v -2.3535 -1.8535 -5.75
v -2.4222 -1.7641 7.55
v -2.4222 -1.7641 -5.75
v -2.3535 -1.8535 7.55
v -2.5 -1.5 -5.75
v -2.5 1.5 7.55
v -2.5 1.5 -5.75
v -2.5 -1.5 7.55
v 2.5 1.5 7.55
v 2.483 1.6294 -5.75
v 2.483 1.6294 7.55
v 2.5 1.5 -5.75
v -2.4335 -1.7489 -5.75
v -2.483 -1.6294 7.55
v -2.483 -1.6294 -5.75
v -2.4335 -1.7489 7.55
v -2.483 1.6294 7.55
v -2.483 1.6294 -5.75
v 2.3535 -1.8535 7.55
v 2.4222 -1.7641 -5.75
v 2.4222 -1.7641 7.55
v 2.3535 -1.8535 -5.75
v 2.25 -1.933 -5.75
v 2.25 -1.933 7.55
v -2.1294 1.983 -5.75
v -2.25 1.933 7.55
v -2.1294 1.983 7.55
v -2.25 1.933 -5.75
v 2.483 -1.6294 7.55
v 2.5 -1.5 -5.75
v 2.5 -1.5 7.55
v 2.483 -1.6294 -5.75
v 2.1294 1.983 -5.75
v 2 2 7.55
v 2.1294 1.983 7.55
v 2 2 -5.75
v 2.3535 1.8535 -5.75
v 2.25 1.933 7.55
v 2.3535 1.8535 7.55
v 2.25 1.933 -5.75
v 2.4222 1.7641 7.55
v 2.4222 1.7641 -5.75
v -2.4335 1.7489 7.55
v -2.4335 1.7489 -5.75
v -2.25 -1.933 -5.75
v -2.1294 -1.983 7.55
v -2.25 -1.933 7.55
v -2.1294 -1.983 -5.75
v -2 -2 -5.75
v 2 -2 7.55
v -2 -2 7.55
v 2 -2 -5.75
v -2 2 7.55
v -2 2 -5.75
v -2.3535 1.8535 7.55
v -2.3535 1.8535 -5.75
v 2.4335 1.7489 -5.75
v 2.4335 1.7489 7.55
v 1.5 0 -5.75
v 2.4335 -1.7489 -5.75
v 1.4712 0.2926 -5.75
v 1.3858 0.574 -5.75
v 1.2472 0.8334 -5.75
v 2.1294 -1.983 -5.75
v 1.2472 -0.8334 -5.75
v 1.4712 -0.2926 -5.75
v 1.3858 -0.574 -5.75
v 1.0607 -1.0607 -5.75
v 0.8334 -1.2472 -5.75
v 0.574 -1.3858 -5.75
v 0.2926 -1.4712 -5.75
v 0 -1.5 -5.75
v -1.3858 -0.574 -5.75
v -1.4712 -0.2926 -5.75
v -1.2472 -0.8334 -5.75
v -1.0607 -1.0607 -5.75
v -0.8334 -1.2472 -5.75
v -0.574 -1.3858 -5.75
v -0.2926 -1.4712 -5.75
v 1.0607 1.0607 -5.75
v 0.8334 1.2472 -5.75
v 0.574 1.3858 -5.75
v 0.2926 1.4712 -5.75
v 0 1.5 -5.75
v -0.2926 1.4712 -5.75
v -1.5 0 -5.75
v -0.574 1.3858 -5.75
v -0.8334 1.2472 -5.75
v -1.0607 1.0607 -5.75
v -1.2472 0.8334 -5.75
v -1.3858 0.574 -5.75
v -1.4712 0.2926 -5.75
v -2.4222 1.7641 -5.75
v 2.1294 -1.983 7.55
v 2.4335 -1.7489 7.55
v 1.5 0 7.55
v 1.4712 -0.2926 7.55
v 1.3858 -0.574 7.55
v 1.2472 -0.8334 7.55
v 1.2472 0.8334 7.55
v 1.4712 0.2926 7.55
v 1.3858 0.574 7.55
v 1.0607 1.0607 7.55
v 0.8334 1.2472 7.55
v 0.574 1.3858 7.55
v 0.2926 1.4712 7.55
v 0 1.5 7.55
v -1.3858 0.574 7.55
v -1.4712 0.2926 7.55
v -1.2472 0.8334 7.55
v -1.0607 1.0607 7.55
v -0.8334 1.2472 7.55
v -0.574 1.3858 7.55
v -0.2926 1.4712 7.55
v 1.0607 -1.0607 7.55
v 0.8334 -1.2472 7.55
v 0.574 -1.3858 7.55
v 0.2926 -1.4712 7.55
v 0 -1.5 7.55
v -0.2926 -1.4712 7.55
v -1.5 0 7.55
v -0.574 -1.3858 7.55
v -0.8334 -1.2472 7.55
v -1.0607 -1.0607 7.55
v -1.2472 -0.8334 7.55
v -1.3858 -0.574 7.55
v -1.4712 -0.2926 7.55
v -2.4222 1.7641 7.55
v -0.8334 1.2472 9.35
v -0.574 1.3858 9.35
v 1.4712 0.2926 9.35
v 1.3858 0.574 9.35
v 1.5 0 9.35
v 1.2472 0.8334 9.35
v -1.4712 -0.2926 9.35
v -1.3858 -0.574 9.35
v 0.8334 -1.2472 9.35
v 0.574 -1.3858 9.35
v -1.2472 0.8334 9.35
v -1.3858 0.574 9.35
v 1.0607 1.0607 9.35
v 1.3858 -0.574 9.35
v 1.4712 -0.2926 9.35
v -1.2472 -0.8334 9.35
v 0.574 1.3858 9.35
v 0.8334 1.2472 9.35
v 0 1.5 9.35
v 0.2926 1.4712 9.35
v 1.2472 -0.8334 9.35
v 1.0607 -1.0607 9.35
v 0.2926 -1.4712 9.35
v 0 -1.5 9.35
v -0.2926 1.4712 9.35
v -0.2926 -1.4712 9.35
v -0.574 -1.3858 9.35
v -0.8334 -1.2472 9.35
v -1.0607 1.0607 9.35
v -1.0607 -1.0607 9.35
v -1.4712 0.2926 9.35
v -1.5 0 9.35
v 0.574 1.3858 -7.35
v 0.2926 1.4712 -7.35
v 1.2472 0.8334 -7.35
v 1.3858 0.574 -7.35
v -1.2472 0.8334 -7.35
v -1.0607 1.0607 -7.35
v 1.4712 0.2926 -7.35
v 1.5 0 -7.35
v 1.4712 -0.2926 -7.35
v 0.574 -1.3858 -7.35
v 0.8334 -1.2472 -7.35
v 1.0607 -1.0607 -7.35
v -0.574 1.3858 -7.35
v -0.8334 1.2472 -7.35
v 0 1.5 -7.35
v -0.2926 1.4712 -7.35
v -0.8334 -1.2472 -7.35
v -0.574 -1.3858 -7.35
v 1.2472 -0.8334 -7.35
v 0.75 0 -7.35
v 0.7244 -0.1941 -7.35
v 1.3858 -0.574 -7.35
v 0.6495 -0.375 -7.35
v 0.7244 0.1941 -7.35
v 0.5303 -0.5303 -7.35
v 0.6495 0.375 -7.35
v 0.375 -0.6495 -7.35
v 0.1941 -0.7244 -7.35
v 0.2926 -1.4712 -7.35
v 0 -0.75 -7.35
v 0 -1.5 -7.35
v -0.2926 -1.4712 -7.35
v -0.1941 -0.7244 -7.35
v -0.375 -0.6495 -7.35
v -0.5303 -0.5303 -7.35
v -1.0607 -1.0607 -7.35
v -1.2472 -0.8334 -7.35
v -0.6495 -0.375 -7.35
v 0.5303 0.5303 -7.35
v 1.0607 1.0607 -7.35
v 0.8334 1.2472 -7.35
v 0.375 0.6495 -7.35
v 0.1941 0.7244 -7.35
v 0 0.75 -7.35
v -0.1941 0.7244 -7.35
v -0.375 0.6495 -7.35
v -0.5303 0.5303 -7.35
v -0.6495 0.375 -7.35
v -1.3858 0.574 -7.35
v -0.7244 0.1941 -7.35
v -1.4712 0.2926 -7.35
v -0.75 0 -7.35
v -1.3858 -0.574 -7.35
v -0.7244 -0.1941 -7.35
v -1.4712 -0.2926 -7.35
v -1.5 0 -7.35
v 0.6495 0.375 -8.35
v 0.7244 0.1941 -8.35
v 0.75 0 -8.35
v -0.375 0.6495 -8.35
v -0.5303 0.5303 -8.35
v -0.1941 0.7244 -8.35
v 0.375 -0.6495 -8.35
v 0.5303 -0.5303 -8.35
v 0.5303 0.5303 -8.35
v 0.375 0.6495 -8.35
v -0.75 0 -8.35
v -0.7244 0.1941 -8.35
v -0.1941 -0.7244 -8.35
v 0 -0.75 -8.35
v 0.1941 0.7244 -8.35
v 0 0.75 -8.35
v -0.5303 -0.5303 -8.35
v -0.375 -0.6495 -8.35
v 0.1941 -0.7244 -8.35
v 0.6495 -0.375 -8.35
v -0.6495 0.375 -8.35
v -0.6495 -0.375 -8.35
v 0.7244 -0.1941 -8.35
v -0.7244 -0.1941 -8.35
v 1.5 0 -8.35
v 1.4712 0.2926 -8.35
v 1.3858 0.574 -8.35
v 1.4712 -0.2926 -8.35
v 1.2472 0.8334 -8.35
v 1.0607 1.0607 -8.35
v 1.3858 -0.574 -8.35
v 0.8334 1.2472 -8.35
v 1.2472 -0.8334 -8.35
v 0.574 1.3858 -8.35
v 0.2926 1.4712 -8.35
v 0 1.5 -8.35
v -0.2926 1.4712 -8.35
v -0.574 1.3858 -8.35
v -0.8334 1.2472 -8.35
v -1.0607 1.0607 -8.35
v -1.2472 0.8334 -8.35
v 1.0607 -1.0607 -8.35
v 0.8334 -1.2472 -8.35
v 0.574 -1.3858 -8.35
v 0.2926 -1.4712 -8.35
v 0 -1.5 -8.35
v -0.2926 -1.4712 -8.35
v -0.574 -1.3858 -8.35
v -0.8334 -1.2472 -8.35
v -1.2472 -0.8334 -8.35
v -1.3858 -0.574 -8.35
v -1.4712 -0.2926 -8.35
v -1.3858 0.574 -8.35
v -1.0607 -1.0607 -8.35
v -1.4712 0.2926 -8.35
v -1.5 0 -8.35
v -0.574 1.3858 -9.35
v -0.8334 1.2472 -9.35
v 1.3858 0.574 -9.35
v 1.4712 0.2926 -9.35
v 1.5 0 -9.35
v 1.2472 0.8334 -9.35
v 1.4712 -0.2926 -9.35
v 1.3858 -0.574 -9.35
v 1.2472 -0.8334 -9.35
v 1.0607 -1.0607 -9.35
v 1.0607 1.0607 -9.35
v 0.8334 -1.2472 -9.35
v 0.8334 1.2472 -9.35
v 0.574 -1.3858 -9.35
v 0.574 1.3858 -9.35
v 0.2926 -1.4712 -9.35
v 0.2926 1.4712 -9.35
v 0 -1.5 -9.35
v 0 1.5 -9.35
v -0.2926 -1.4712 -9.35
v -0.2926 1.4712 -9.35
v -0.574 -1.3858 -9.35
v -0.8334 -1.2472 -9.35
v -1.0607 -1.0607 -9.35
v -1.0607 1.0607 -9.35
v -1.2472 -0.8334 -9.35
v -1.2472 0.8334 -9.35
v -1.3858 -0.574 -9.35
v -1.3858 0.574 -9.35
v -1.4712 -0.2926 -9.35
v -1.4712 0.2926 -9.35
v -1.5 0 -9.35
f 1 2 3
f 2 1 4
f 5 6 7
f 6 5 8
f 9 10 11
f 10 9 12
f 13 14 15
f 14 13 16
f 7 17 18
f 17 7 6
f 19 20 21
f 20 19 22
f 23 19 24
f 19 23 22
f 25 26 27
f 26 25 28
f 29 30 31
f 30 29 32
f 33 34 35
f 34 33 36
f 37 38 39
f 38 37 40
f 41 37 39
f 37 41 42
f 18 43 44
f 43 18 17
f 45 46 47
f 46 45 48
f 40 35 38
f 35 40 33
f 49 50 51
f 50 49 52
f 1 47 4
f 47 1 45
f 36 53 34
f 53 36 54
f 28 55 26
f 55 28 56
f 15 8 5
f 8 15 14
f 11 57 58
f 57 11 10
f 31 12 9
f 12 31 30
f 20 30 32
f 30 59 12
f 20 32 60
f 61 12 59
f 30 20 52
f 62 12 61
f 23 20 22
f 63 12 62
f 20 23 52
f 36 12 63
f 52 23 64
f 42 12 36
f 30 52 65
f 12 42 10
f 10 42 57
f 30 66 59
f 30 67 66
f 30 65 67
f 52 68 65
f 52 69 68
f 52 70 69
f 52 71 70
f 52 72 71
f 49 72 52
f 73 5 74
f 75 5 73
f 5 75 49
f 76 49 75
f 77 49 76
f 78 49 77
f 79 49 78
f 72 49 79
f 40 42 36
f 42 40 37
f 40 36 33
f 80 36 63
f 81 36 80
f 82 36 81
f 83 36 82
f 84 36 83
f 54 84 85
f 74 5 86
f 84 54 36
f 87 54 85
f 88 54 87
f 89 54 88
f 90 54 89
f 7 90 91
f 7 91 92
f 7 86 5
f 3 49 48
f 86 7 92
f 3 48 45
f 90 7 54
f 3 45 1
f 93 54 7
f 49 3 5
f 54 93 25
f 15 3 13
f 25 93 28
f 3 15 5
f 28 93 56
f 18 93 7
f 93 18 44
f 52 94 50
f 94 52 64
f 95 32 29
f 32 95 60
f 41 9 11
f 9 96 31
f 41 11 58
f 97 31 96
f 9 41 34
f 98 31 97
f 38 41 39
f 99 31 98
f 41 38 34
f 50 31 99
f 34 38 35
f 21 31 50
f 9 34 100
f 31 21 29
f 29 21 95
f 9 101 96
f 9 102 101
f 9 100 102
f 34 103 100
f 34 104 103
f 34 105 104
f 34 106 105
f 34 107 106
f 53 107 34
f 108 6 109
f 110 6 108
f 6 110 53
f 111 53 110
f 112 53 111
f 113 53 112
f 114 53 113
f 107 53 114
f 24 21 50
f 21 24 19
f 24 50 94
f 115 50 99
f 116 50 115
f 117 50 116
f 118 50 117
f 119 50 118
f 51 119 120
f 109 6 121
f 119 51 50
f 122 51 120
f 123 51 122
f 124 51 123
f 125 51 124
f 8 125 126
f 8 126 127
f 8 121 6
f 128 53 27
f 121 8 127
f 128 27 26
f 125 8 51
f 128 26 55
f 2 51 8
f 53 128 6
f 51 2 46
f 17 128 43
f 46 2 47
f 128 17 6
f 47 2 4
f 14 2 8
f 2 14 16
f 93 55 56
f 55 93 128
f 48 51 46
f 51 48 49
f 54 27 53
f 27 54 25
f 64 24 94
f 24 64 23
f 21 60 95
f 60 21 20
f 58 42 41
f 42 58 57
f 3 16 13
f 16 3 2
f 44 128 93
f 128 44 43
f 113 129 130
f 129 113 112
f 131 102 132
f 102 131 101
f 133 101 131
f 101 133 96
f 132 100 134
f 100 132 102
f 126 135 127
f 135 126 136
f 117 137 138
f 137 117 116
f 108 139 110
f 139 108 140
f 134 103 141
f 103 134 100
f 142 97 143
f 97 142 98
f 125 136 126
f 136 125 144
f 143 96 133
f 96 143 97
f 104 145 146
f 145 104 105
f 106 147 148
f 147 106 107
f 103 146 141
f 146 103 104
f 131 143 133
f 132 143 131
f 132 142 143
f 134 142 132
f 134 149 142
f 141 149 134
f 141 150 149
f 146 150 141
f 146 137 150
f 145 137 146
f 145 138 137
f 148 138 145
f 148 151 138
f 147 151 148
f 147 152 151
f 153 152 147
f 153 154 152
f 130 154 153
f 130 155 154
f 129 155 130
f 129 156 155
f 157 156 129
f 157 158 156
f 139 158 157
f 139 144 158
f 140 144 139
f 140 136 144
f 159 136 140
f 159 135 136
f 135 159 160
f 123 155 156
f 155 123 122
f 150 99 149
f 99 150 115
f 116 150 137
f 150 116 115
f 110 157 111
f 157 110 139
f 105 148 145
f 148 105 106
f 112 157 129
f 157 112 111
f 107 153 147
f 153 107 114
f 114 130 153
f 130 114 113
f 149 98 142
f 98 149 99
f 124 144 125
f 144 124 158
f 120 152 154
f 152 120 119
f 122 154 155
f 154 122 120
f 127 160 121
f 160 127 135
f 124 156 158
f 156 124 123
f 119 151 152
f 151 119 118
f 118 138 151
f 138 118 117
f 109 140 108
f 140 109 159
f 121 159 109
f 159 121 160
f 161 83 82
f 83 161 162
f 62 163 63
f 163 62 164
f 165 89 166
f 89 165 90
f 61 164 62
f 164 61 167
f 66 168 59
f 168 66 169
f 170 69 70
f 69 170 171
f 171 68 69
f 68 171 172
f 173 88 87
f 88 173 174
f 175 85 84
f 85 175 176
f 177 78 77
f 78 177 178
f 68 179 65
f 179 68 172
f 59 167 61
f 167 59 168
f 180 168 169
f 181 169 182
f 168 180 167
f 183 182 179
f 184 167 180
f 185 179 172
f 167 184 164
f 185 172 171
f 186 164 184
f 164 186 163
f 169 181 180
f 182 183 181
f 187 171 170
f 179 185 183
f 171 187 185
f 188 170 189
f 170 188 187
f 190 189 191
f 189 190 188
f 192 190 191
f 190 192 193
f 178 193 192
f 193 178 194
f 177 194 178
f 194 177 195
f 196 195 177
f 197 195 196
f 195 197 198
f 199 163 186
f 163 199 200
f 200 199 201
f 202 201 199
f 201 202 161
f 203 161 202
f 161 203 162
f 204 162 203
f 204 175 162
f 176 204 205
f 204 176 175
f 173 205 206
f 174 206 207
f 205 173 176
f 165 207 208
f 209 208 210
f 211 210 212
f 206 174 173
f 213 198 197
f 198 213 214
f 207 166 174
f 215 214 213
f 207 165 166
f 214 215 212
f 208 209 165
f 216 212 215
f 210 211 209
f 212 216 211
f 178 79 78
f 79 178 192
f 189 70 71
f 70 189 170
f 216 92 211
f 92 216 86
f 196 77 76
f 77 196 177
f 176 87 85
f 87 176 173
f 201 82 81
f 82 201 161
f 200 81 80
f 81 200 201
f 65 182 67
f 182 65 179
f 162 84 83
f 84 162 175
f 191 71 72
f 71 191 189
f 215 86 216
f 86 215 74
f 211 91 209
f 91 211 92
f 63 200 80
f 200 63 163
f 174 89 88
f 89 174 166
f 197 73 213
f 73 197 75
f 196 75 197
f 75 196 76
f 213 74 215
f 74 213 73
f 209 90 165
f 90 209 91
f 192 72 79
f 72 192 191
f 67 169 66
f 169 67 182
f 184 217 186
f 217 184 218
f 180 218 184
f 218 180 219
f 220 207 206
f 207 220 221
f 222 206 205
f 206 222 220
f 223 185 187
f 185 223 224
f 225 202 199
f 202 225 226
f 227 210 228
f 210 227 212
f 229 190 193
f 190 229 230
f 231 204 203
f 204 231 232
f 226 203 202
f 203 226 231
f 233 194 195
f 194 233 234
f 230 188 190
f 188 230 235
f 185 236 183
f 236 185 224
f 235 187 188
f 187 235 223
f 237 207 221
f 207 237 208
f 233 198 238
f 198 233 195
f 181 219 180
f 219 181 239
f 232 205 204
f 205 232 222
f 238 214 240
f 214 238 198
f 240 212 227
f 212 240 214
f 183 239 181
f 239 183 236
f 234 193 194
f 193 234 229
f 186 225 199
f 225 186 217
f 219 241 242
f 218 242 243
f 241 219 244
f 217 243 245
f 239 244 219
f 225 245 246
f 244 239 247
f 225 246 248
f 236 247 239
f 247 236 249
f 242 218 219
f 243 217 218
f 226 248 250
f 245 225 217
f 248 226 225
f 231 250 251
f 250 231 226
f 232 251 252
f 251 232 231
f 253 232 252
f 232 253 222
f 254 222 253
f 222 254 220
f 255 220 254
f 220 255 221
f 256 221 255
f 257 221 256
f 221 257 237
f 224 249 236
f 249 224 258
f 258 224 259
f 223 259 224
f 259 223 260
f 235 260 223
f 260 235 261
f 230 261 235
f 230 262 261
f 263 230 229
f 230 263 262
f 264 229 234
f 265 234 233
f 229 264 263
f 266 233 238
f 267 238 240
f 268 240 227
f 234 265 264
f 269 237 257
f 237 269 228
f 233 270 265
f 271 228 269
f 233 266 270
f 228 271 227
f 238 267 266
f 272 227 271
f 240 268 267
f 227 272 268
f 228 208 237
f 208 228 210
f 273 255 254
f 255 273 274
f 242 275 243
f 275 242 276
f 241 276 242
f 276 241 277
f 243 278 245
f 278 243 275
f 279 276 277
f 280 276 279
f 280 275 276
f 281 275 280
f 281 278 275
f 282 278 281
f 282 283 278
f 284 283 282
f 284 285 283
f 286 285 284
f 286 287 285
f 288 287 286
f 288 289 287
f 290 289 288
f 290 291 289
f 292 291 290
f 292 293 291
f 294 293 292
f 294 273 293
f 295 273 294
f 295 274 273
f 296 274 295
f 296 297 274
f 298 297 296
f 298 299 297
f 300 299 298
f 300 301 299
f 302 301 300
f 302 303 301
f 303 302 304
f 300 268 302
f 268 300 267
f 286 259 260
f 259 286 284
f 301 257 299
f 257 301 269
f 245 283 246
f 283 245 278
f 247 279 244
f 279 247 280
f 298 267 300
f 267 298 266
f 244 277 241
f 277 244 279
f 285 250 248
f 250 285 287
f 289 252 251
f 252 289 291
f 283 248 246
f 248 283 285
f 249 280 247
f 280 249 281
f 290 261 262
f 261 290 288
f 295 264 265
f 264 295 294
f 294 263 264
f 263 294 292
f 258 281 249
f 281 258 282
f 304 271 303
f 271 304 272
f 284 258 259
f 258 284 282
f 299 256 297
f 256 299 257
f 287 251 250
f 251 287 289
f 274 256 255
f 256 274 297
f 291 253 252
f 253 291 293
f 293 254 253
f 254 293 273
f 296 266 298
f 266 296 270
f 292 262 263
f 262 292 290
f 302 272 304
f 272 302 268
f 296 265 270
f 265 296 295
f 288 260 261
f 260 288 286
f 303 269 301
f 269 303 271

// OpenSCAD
// part_id: b17
// name: B17 standoff pin
// source_drawing_ids: DRW-002
// units: mm
// revision: 0.1
// SPDX-License-Identifier: MIT

module rounded_rect_2d(w = 6.0, d = 4.0, corner_r = 0.5) {
    hull() {
        for (sx = [-1, 1])
            for (sy = [-1, 1])
                translate([sx * (w / 2 - corner_r), sy * (d / 2 - corner_r)])
                    circle(r = corner_r, $fn = 24);
    }
}

// Axis is +Z following the drawing side view.
module part_b17(
    body_w = 5.0,
    body_d = 4.0,
    body_corner_to_corner_d = 6.0,
    body_h = 13.3,
    top_pin_d = 3.0,
    top_pin_h = 1.8,
    lower_neck_d = 3.0,
    lower_neck_h = 1.6,
    lower_pin_d = 1.5,
    lower_pin_h = 1.0,
    lower_end_d = 3.0,
    lower_end_h = 1.0
) {
    total_h = body_h + top_pin_h + lower_neck_h + lower_pin_h + lower_end_h;

    translate([0, 0, -(-lower_neck_h - lower_pin_h - lower_end_h + total_h / 2)])
        union() {
            intersection() {
                linear_extrude(height = body_h)
                    rounded_rect_2d(w = body_w, d = body_d, corner_r = 0.5);

                cylinder(d = body_corner_to_corner_d, h = body_h, center = false, $fn = 64);
            }

            translate([0, 0, body_h])
                cylinder(d = top_pin_d, h = top_pin_h, center = false, $fn = 32);

            translate([0, 0, -lower_neck_h])
                cylinder(d = lower_neck_d, h = lower_neck_h, center = false, $fn = 32);

            translate([0, 0, -lower_neck_h - lower_pin_h])
                cylinder(d = lower_pin_d, h = lower_pin_h, center = false, $fn = 24);

            translate([0, 0, -lower_neck_h - lower_pin_h - lower_end_h])
                cylinder(d = lower_end_d, h = lower_end_h, center = false, $fn = 32);
        }
}

// ---- "main guard" ----
// Default to previewing when opened directly:
if (is_undef(__LIB_MODE__)) {
    part_b17();
}
